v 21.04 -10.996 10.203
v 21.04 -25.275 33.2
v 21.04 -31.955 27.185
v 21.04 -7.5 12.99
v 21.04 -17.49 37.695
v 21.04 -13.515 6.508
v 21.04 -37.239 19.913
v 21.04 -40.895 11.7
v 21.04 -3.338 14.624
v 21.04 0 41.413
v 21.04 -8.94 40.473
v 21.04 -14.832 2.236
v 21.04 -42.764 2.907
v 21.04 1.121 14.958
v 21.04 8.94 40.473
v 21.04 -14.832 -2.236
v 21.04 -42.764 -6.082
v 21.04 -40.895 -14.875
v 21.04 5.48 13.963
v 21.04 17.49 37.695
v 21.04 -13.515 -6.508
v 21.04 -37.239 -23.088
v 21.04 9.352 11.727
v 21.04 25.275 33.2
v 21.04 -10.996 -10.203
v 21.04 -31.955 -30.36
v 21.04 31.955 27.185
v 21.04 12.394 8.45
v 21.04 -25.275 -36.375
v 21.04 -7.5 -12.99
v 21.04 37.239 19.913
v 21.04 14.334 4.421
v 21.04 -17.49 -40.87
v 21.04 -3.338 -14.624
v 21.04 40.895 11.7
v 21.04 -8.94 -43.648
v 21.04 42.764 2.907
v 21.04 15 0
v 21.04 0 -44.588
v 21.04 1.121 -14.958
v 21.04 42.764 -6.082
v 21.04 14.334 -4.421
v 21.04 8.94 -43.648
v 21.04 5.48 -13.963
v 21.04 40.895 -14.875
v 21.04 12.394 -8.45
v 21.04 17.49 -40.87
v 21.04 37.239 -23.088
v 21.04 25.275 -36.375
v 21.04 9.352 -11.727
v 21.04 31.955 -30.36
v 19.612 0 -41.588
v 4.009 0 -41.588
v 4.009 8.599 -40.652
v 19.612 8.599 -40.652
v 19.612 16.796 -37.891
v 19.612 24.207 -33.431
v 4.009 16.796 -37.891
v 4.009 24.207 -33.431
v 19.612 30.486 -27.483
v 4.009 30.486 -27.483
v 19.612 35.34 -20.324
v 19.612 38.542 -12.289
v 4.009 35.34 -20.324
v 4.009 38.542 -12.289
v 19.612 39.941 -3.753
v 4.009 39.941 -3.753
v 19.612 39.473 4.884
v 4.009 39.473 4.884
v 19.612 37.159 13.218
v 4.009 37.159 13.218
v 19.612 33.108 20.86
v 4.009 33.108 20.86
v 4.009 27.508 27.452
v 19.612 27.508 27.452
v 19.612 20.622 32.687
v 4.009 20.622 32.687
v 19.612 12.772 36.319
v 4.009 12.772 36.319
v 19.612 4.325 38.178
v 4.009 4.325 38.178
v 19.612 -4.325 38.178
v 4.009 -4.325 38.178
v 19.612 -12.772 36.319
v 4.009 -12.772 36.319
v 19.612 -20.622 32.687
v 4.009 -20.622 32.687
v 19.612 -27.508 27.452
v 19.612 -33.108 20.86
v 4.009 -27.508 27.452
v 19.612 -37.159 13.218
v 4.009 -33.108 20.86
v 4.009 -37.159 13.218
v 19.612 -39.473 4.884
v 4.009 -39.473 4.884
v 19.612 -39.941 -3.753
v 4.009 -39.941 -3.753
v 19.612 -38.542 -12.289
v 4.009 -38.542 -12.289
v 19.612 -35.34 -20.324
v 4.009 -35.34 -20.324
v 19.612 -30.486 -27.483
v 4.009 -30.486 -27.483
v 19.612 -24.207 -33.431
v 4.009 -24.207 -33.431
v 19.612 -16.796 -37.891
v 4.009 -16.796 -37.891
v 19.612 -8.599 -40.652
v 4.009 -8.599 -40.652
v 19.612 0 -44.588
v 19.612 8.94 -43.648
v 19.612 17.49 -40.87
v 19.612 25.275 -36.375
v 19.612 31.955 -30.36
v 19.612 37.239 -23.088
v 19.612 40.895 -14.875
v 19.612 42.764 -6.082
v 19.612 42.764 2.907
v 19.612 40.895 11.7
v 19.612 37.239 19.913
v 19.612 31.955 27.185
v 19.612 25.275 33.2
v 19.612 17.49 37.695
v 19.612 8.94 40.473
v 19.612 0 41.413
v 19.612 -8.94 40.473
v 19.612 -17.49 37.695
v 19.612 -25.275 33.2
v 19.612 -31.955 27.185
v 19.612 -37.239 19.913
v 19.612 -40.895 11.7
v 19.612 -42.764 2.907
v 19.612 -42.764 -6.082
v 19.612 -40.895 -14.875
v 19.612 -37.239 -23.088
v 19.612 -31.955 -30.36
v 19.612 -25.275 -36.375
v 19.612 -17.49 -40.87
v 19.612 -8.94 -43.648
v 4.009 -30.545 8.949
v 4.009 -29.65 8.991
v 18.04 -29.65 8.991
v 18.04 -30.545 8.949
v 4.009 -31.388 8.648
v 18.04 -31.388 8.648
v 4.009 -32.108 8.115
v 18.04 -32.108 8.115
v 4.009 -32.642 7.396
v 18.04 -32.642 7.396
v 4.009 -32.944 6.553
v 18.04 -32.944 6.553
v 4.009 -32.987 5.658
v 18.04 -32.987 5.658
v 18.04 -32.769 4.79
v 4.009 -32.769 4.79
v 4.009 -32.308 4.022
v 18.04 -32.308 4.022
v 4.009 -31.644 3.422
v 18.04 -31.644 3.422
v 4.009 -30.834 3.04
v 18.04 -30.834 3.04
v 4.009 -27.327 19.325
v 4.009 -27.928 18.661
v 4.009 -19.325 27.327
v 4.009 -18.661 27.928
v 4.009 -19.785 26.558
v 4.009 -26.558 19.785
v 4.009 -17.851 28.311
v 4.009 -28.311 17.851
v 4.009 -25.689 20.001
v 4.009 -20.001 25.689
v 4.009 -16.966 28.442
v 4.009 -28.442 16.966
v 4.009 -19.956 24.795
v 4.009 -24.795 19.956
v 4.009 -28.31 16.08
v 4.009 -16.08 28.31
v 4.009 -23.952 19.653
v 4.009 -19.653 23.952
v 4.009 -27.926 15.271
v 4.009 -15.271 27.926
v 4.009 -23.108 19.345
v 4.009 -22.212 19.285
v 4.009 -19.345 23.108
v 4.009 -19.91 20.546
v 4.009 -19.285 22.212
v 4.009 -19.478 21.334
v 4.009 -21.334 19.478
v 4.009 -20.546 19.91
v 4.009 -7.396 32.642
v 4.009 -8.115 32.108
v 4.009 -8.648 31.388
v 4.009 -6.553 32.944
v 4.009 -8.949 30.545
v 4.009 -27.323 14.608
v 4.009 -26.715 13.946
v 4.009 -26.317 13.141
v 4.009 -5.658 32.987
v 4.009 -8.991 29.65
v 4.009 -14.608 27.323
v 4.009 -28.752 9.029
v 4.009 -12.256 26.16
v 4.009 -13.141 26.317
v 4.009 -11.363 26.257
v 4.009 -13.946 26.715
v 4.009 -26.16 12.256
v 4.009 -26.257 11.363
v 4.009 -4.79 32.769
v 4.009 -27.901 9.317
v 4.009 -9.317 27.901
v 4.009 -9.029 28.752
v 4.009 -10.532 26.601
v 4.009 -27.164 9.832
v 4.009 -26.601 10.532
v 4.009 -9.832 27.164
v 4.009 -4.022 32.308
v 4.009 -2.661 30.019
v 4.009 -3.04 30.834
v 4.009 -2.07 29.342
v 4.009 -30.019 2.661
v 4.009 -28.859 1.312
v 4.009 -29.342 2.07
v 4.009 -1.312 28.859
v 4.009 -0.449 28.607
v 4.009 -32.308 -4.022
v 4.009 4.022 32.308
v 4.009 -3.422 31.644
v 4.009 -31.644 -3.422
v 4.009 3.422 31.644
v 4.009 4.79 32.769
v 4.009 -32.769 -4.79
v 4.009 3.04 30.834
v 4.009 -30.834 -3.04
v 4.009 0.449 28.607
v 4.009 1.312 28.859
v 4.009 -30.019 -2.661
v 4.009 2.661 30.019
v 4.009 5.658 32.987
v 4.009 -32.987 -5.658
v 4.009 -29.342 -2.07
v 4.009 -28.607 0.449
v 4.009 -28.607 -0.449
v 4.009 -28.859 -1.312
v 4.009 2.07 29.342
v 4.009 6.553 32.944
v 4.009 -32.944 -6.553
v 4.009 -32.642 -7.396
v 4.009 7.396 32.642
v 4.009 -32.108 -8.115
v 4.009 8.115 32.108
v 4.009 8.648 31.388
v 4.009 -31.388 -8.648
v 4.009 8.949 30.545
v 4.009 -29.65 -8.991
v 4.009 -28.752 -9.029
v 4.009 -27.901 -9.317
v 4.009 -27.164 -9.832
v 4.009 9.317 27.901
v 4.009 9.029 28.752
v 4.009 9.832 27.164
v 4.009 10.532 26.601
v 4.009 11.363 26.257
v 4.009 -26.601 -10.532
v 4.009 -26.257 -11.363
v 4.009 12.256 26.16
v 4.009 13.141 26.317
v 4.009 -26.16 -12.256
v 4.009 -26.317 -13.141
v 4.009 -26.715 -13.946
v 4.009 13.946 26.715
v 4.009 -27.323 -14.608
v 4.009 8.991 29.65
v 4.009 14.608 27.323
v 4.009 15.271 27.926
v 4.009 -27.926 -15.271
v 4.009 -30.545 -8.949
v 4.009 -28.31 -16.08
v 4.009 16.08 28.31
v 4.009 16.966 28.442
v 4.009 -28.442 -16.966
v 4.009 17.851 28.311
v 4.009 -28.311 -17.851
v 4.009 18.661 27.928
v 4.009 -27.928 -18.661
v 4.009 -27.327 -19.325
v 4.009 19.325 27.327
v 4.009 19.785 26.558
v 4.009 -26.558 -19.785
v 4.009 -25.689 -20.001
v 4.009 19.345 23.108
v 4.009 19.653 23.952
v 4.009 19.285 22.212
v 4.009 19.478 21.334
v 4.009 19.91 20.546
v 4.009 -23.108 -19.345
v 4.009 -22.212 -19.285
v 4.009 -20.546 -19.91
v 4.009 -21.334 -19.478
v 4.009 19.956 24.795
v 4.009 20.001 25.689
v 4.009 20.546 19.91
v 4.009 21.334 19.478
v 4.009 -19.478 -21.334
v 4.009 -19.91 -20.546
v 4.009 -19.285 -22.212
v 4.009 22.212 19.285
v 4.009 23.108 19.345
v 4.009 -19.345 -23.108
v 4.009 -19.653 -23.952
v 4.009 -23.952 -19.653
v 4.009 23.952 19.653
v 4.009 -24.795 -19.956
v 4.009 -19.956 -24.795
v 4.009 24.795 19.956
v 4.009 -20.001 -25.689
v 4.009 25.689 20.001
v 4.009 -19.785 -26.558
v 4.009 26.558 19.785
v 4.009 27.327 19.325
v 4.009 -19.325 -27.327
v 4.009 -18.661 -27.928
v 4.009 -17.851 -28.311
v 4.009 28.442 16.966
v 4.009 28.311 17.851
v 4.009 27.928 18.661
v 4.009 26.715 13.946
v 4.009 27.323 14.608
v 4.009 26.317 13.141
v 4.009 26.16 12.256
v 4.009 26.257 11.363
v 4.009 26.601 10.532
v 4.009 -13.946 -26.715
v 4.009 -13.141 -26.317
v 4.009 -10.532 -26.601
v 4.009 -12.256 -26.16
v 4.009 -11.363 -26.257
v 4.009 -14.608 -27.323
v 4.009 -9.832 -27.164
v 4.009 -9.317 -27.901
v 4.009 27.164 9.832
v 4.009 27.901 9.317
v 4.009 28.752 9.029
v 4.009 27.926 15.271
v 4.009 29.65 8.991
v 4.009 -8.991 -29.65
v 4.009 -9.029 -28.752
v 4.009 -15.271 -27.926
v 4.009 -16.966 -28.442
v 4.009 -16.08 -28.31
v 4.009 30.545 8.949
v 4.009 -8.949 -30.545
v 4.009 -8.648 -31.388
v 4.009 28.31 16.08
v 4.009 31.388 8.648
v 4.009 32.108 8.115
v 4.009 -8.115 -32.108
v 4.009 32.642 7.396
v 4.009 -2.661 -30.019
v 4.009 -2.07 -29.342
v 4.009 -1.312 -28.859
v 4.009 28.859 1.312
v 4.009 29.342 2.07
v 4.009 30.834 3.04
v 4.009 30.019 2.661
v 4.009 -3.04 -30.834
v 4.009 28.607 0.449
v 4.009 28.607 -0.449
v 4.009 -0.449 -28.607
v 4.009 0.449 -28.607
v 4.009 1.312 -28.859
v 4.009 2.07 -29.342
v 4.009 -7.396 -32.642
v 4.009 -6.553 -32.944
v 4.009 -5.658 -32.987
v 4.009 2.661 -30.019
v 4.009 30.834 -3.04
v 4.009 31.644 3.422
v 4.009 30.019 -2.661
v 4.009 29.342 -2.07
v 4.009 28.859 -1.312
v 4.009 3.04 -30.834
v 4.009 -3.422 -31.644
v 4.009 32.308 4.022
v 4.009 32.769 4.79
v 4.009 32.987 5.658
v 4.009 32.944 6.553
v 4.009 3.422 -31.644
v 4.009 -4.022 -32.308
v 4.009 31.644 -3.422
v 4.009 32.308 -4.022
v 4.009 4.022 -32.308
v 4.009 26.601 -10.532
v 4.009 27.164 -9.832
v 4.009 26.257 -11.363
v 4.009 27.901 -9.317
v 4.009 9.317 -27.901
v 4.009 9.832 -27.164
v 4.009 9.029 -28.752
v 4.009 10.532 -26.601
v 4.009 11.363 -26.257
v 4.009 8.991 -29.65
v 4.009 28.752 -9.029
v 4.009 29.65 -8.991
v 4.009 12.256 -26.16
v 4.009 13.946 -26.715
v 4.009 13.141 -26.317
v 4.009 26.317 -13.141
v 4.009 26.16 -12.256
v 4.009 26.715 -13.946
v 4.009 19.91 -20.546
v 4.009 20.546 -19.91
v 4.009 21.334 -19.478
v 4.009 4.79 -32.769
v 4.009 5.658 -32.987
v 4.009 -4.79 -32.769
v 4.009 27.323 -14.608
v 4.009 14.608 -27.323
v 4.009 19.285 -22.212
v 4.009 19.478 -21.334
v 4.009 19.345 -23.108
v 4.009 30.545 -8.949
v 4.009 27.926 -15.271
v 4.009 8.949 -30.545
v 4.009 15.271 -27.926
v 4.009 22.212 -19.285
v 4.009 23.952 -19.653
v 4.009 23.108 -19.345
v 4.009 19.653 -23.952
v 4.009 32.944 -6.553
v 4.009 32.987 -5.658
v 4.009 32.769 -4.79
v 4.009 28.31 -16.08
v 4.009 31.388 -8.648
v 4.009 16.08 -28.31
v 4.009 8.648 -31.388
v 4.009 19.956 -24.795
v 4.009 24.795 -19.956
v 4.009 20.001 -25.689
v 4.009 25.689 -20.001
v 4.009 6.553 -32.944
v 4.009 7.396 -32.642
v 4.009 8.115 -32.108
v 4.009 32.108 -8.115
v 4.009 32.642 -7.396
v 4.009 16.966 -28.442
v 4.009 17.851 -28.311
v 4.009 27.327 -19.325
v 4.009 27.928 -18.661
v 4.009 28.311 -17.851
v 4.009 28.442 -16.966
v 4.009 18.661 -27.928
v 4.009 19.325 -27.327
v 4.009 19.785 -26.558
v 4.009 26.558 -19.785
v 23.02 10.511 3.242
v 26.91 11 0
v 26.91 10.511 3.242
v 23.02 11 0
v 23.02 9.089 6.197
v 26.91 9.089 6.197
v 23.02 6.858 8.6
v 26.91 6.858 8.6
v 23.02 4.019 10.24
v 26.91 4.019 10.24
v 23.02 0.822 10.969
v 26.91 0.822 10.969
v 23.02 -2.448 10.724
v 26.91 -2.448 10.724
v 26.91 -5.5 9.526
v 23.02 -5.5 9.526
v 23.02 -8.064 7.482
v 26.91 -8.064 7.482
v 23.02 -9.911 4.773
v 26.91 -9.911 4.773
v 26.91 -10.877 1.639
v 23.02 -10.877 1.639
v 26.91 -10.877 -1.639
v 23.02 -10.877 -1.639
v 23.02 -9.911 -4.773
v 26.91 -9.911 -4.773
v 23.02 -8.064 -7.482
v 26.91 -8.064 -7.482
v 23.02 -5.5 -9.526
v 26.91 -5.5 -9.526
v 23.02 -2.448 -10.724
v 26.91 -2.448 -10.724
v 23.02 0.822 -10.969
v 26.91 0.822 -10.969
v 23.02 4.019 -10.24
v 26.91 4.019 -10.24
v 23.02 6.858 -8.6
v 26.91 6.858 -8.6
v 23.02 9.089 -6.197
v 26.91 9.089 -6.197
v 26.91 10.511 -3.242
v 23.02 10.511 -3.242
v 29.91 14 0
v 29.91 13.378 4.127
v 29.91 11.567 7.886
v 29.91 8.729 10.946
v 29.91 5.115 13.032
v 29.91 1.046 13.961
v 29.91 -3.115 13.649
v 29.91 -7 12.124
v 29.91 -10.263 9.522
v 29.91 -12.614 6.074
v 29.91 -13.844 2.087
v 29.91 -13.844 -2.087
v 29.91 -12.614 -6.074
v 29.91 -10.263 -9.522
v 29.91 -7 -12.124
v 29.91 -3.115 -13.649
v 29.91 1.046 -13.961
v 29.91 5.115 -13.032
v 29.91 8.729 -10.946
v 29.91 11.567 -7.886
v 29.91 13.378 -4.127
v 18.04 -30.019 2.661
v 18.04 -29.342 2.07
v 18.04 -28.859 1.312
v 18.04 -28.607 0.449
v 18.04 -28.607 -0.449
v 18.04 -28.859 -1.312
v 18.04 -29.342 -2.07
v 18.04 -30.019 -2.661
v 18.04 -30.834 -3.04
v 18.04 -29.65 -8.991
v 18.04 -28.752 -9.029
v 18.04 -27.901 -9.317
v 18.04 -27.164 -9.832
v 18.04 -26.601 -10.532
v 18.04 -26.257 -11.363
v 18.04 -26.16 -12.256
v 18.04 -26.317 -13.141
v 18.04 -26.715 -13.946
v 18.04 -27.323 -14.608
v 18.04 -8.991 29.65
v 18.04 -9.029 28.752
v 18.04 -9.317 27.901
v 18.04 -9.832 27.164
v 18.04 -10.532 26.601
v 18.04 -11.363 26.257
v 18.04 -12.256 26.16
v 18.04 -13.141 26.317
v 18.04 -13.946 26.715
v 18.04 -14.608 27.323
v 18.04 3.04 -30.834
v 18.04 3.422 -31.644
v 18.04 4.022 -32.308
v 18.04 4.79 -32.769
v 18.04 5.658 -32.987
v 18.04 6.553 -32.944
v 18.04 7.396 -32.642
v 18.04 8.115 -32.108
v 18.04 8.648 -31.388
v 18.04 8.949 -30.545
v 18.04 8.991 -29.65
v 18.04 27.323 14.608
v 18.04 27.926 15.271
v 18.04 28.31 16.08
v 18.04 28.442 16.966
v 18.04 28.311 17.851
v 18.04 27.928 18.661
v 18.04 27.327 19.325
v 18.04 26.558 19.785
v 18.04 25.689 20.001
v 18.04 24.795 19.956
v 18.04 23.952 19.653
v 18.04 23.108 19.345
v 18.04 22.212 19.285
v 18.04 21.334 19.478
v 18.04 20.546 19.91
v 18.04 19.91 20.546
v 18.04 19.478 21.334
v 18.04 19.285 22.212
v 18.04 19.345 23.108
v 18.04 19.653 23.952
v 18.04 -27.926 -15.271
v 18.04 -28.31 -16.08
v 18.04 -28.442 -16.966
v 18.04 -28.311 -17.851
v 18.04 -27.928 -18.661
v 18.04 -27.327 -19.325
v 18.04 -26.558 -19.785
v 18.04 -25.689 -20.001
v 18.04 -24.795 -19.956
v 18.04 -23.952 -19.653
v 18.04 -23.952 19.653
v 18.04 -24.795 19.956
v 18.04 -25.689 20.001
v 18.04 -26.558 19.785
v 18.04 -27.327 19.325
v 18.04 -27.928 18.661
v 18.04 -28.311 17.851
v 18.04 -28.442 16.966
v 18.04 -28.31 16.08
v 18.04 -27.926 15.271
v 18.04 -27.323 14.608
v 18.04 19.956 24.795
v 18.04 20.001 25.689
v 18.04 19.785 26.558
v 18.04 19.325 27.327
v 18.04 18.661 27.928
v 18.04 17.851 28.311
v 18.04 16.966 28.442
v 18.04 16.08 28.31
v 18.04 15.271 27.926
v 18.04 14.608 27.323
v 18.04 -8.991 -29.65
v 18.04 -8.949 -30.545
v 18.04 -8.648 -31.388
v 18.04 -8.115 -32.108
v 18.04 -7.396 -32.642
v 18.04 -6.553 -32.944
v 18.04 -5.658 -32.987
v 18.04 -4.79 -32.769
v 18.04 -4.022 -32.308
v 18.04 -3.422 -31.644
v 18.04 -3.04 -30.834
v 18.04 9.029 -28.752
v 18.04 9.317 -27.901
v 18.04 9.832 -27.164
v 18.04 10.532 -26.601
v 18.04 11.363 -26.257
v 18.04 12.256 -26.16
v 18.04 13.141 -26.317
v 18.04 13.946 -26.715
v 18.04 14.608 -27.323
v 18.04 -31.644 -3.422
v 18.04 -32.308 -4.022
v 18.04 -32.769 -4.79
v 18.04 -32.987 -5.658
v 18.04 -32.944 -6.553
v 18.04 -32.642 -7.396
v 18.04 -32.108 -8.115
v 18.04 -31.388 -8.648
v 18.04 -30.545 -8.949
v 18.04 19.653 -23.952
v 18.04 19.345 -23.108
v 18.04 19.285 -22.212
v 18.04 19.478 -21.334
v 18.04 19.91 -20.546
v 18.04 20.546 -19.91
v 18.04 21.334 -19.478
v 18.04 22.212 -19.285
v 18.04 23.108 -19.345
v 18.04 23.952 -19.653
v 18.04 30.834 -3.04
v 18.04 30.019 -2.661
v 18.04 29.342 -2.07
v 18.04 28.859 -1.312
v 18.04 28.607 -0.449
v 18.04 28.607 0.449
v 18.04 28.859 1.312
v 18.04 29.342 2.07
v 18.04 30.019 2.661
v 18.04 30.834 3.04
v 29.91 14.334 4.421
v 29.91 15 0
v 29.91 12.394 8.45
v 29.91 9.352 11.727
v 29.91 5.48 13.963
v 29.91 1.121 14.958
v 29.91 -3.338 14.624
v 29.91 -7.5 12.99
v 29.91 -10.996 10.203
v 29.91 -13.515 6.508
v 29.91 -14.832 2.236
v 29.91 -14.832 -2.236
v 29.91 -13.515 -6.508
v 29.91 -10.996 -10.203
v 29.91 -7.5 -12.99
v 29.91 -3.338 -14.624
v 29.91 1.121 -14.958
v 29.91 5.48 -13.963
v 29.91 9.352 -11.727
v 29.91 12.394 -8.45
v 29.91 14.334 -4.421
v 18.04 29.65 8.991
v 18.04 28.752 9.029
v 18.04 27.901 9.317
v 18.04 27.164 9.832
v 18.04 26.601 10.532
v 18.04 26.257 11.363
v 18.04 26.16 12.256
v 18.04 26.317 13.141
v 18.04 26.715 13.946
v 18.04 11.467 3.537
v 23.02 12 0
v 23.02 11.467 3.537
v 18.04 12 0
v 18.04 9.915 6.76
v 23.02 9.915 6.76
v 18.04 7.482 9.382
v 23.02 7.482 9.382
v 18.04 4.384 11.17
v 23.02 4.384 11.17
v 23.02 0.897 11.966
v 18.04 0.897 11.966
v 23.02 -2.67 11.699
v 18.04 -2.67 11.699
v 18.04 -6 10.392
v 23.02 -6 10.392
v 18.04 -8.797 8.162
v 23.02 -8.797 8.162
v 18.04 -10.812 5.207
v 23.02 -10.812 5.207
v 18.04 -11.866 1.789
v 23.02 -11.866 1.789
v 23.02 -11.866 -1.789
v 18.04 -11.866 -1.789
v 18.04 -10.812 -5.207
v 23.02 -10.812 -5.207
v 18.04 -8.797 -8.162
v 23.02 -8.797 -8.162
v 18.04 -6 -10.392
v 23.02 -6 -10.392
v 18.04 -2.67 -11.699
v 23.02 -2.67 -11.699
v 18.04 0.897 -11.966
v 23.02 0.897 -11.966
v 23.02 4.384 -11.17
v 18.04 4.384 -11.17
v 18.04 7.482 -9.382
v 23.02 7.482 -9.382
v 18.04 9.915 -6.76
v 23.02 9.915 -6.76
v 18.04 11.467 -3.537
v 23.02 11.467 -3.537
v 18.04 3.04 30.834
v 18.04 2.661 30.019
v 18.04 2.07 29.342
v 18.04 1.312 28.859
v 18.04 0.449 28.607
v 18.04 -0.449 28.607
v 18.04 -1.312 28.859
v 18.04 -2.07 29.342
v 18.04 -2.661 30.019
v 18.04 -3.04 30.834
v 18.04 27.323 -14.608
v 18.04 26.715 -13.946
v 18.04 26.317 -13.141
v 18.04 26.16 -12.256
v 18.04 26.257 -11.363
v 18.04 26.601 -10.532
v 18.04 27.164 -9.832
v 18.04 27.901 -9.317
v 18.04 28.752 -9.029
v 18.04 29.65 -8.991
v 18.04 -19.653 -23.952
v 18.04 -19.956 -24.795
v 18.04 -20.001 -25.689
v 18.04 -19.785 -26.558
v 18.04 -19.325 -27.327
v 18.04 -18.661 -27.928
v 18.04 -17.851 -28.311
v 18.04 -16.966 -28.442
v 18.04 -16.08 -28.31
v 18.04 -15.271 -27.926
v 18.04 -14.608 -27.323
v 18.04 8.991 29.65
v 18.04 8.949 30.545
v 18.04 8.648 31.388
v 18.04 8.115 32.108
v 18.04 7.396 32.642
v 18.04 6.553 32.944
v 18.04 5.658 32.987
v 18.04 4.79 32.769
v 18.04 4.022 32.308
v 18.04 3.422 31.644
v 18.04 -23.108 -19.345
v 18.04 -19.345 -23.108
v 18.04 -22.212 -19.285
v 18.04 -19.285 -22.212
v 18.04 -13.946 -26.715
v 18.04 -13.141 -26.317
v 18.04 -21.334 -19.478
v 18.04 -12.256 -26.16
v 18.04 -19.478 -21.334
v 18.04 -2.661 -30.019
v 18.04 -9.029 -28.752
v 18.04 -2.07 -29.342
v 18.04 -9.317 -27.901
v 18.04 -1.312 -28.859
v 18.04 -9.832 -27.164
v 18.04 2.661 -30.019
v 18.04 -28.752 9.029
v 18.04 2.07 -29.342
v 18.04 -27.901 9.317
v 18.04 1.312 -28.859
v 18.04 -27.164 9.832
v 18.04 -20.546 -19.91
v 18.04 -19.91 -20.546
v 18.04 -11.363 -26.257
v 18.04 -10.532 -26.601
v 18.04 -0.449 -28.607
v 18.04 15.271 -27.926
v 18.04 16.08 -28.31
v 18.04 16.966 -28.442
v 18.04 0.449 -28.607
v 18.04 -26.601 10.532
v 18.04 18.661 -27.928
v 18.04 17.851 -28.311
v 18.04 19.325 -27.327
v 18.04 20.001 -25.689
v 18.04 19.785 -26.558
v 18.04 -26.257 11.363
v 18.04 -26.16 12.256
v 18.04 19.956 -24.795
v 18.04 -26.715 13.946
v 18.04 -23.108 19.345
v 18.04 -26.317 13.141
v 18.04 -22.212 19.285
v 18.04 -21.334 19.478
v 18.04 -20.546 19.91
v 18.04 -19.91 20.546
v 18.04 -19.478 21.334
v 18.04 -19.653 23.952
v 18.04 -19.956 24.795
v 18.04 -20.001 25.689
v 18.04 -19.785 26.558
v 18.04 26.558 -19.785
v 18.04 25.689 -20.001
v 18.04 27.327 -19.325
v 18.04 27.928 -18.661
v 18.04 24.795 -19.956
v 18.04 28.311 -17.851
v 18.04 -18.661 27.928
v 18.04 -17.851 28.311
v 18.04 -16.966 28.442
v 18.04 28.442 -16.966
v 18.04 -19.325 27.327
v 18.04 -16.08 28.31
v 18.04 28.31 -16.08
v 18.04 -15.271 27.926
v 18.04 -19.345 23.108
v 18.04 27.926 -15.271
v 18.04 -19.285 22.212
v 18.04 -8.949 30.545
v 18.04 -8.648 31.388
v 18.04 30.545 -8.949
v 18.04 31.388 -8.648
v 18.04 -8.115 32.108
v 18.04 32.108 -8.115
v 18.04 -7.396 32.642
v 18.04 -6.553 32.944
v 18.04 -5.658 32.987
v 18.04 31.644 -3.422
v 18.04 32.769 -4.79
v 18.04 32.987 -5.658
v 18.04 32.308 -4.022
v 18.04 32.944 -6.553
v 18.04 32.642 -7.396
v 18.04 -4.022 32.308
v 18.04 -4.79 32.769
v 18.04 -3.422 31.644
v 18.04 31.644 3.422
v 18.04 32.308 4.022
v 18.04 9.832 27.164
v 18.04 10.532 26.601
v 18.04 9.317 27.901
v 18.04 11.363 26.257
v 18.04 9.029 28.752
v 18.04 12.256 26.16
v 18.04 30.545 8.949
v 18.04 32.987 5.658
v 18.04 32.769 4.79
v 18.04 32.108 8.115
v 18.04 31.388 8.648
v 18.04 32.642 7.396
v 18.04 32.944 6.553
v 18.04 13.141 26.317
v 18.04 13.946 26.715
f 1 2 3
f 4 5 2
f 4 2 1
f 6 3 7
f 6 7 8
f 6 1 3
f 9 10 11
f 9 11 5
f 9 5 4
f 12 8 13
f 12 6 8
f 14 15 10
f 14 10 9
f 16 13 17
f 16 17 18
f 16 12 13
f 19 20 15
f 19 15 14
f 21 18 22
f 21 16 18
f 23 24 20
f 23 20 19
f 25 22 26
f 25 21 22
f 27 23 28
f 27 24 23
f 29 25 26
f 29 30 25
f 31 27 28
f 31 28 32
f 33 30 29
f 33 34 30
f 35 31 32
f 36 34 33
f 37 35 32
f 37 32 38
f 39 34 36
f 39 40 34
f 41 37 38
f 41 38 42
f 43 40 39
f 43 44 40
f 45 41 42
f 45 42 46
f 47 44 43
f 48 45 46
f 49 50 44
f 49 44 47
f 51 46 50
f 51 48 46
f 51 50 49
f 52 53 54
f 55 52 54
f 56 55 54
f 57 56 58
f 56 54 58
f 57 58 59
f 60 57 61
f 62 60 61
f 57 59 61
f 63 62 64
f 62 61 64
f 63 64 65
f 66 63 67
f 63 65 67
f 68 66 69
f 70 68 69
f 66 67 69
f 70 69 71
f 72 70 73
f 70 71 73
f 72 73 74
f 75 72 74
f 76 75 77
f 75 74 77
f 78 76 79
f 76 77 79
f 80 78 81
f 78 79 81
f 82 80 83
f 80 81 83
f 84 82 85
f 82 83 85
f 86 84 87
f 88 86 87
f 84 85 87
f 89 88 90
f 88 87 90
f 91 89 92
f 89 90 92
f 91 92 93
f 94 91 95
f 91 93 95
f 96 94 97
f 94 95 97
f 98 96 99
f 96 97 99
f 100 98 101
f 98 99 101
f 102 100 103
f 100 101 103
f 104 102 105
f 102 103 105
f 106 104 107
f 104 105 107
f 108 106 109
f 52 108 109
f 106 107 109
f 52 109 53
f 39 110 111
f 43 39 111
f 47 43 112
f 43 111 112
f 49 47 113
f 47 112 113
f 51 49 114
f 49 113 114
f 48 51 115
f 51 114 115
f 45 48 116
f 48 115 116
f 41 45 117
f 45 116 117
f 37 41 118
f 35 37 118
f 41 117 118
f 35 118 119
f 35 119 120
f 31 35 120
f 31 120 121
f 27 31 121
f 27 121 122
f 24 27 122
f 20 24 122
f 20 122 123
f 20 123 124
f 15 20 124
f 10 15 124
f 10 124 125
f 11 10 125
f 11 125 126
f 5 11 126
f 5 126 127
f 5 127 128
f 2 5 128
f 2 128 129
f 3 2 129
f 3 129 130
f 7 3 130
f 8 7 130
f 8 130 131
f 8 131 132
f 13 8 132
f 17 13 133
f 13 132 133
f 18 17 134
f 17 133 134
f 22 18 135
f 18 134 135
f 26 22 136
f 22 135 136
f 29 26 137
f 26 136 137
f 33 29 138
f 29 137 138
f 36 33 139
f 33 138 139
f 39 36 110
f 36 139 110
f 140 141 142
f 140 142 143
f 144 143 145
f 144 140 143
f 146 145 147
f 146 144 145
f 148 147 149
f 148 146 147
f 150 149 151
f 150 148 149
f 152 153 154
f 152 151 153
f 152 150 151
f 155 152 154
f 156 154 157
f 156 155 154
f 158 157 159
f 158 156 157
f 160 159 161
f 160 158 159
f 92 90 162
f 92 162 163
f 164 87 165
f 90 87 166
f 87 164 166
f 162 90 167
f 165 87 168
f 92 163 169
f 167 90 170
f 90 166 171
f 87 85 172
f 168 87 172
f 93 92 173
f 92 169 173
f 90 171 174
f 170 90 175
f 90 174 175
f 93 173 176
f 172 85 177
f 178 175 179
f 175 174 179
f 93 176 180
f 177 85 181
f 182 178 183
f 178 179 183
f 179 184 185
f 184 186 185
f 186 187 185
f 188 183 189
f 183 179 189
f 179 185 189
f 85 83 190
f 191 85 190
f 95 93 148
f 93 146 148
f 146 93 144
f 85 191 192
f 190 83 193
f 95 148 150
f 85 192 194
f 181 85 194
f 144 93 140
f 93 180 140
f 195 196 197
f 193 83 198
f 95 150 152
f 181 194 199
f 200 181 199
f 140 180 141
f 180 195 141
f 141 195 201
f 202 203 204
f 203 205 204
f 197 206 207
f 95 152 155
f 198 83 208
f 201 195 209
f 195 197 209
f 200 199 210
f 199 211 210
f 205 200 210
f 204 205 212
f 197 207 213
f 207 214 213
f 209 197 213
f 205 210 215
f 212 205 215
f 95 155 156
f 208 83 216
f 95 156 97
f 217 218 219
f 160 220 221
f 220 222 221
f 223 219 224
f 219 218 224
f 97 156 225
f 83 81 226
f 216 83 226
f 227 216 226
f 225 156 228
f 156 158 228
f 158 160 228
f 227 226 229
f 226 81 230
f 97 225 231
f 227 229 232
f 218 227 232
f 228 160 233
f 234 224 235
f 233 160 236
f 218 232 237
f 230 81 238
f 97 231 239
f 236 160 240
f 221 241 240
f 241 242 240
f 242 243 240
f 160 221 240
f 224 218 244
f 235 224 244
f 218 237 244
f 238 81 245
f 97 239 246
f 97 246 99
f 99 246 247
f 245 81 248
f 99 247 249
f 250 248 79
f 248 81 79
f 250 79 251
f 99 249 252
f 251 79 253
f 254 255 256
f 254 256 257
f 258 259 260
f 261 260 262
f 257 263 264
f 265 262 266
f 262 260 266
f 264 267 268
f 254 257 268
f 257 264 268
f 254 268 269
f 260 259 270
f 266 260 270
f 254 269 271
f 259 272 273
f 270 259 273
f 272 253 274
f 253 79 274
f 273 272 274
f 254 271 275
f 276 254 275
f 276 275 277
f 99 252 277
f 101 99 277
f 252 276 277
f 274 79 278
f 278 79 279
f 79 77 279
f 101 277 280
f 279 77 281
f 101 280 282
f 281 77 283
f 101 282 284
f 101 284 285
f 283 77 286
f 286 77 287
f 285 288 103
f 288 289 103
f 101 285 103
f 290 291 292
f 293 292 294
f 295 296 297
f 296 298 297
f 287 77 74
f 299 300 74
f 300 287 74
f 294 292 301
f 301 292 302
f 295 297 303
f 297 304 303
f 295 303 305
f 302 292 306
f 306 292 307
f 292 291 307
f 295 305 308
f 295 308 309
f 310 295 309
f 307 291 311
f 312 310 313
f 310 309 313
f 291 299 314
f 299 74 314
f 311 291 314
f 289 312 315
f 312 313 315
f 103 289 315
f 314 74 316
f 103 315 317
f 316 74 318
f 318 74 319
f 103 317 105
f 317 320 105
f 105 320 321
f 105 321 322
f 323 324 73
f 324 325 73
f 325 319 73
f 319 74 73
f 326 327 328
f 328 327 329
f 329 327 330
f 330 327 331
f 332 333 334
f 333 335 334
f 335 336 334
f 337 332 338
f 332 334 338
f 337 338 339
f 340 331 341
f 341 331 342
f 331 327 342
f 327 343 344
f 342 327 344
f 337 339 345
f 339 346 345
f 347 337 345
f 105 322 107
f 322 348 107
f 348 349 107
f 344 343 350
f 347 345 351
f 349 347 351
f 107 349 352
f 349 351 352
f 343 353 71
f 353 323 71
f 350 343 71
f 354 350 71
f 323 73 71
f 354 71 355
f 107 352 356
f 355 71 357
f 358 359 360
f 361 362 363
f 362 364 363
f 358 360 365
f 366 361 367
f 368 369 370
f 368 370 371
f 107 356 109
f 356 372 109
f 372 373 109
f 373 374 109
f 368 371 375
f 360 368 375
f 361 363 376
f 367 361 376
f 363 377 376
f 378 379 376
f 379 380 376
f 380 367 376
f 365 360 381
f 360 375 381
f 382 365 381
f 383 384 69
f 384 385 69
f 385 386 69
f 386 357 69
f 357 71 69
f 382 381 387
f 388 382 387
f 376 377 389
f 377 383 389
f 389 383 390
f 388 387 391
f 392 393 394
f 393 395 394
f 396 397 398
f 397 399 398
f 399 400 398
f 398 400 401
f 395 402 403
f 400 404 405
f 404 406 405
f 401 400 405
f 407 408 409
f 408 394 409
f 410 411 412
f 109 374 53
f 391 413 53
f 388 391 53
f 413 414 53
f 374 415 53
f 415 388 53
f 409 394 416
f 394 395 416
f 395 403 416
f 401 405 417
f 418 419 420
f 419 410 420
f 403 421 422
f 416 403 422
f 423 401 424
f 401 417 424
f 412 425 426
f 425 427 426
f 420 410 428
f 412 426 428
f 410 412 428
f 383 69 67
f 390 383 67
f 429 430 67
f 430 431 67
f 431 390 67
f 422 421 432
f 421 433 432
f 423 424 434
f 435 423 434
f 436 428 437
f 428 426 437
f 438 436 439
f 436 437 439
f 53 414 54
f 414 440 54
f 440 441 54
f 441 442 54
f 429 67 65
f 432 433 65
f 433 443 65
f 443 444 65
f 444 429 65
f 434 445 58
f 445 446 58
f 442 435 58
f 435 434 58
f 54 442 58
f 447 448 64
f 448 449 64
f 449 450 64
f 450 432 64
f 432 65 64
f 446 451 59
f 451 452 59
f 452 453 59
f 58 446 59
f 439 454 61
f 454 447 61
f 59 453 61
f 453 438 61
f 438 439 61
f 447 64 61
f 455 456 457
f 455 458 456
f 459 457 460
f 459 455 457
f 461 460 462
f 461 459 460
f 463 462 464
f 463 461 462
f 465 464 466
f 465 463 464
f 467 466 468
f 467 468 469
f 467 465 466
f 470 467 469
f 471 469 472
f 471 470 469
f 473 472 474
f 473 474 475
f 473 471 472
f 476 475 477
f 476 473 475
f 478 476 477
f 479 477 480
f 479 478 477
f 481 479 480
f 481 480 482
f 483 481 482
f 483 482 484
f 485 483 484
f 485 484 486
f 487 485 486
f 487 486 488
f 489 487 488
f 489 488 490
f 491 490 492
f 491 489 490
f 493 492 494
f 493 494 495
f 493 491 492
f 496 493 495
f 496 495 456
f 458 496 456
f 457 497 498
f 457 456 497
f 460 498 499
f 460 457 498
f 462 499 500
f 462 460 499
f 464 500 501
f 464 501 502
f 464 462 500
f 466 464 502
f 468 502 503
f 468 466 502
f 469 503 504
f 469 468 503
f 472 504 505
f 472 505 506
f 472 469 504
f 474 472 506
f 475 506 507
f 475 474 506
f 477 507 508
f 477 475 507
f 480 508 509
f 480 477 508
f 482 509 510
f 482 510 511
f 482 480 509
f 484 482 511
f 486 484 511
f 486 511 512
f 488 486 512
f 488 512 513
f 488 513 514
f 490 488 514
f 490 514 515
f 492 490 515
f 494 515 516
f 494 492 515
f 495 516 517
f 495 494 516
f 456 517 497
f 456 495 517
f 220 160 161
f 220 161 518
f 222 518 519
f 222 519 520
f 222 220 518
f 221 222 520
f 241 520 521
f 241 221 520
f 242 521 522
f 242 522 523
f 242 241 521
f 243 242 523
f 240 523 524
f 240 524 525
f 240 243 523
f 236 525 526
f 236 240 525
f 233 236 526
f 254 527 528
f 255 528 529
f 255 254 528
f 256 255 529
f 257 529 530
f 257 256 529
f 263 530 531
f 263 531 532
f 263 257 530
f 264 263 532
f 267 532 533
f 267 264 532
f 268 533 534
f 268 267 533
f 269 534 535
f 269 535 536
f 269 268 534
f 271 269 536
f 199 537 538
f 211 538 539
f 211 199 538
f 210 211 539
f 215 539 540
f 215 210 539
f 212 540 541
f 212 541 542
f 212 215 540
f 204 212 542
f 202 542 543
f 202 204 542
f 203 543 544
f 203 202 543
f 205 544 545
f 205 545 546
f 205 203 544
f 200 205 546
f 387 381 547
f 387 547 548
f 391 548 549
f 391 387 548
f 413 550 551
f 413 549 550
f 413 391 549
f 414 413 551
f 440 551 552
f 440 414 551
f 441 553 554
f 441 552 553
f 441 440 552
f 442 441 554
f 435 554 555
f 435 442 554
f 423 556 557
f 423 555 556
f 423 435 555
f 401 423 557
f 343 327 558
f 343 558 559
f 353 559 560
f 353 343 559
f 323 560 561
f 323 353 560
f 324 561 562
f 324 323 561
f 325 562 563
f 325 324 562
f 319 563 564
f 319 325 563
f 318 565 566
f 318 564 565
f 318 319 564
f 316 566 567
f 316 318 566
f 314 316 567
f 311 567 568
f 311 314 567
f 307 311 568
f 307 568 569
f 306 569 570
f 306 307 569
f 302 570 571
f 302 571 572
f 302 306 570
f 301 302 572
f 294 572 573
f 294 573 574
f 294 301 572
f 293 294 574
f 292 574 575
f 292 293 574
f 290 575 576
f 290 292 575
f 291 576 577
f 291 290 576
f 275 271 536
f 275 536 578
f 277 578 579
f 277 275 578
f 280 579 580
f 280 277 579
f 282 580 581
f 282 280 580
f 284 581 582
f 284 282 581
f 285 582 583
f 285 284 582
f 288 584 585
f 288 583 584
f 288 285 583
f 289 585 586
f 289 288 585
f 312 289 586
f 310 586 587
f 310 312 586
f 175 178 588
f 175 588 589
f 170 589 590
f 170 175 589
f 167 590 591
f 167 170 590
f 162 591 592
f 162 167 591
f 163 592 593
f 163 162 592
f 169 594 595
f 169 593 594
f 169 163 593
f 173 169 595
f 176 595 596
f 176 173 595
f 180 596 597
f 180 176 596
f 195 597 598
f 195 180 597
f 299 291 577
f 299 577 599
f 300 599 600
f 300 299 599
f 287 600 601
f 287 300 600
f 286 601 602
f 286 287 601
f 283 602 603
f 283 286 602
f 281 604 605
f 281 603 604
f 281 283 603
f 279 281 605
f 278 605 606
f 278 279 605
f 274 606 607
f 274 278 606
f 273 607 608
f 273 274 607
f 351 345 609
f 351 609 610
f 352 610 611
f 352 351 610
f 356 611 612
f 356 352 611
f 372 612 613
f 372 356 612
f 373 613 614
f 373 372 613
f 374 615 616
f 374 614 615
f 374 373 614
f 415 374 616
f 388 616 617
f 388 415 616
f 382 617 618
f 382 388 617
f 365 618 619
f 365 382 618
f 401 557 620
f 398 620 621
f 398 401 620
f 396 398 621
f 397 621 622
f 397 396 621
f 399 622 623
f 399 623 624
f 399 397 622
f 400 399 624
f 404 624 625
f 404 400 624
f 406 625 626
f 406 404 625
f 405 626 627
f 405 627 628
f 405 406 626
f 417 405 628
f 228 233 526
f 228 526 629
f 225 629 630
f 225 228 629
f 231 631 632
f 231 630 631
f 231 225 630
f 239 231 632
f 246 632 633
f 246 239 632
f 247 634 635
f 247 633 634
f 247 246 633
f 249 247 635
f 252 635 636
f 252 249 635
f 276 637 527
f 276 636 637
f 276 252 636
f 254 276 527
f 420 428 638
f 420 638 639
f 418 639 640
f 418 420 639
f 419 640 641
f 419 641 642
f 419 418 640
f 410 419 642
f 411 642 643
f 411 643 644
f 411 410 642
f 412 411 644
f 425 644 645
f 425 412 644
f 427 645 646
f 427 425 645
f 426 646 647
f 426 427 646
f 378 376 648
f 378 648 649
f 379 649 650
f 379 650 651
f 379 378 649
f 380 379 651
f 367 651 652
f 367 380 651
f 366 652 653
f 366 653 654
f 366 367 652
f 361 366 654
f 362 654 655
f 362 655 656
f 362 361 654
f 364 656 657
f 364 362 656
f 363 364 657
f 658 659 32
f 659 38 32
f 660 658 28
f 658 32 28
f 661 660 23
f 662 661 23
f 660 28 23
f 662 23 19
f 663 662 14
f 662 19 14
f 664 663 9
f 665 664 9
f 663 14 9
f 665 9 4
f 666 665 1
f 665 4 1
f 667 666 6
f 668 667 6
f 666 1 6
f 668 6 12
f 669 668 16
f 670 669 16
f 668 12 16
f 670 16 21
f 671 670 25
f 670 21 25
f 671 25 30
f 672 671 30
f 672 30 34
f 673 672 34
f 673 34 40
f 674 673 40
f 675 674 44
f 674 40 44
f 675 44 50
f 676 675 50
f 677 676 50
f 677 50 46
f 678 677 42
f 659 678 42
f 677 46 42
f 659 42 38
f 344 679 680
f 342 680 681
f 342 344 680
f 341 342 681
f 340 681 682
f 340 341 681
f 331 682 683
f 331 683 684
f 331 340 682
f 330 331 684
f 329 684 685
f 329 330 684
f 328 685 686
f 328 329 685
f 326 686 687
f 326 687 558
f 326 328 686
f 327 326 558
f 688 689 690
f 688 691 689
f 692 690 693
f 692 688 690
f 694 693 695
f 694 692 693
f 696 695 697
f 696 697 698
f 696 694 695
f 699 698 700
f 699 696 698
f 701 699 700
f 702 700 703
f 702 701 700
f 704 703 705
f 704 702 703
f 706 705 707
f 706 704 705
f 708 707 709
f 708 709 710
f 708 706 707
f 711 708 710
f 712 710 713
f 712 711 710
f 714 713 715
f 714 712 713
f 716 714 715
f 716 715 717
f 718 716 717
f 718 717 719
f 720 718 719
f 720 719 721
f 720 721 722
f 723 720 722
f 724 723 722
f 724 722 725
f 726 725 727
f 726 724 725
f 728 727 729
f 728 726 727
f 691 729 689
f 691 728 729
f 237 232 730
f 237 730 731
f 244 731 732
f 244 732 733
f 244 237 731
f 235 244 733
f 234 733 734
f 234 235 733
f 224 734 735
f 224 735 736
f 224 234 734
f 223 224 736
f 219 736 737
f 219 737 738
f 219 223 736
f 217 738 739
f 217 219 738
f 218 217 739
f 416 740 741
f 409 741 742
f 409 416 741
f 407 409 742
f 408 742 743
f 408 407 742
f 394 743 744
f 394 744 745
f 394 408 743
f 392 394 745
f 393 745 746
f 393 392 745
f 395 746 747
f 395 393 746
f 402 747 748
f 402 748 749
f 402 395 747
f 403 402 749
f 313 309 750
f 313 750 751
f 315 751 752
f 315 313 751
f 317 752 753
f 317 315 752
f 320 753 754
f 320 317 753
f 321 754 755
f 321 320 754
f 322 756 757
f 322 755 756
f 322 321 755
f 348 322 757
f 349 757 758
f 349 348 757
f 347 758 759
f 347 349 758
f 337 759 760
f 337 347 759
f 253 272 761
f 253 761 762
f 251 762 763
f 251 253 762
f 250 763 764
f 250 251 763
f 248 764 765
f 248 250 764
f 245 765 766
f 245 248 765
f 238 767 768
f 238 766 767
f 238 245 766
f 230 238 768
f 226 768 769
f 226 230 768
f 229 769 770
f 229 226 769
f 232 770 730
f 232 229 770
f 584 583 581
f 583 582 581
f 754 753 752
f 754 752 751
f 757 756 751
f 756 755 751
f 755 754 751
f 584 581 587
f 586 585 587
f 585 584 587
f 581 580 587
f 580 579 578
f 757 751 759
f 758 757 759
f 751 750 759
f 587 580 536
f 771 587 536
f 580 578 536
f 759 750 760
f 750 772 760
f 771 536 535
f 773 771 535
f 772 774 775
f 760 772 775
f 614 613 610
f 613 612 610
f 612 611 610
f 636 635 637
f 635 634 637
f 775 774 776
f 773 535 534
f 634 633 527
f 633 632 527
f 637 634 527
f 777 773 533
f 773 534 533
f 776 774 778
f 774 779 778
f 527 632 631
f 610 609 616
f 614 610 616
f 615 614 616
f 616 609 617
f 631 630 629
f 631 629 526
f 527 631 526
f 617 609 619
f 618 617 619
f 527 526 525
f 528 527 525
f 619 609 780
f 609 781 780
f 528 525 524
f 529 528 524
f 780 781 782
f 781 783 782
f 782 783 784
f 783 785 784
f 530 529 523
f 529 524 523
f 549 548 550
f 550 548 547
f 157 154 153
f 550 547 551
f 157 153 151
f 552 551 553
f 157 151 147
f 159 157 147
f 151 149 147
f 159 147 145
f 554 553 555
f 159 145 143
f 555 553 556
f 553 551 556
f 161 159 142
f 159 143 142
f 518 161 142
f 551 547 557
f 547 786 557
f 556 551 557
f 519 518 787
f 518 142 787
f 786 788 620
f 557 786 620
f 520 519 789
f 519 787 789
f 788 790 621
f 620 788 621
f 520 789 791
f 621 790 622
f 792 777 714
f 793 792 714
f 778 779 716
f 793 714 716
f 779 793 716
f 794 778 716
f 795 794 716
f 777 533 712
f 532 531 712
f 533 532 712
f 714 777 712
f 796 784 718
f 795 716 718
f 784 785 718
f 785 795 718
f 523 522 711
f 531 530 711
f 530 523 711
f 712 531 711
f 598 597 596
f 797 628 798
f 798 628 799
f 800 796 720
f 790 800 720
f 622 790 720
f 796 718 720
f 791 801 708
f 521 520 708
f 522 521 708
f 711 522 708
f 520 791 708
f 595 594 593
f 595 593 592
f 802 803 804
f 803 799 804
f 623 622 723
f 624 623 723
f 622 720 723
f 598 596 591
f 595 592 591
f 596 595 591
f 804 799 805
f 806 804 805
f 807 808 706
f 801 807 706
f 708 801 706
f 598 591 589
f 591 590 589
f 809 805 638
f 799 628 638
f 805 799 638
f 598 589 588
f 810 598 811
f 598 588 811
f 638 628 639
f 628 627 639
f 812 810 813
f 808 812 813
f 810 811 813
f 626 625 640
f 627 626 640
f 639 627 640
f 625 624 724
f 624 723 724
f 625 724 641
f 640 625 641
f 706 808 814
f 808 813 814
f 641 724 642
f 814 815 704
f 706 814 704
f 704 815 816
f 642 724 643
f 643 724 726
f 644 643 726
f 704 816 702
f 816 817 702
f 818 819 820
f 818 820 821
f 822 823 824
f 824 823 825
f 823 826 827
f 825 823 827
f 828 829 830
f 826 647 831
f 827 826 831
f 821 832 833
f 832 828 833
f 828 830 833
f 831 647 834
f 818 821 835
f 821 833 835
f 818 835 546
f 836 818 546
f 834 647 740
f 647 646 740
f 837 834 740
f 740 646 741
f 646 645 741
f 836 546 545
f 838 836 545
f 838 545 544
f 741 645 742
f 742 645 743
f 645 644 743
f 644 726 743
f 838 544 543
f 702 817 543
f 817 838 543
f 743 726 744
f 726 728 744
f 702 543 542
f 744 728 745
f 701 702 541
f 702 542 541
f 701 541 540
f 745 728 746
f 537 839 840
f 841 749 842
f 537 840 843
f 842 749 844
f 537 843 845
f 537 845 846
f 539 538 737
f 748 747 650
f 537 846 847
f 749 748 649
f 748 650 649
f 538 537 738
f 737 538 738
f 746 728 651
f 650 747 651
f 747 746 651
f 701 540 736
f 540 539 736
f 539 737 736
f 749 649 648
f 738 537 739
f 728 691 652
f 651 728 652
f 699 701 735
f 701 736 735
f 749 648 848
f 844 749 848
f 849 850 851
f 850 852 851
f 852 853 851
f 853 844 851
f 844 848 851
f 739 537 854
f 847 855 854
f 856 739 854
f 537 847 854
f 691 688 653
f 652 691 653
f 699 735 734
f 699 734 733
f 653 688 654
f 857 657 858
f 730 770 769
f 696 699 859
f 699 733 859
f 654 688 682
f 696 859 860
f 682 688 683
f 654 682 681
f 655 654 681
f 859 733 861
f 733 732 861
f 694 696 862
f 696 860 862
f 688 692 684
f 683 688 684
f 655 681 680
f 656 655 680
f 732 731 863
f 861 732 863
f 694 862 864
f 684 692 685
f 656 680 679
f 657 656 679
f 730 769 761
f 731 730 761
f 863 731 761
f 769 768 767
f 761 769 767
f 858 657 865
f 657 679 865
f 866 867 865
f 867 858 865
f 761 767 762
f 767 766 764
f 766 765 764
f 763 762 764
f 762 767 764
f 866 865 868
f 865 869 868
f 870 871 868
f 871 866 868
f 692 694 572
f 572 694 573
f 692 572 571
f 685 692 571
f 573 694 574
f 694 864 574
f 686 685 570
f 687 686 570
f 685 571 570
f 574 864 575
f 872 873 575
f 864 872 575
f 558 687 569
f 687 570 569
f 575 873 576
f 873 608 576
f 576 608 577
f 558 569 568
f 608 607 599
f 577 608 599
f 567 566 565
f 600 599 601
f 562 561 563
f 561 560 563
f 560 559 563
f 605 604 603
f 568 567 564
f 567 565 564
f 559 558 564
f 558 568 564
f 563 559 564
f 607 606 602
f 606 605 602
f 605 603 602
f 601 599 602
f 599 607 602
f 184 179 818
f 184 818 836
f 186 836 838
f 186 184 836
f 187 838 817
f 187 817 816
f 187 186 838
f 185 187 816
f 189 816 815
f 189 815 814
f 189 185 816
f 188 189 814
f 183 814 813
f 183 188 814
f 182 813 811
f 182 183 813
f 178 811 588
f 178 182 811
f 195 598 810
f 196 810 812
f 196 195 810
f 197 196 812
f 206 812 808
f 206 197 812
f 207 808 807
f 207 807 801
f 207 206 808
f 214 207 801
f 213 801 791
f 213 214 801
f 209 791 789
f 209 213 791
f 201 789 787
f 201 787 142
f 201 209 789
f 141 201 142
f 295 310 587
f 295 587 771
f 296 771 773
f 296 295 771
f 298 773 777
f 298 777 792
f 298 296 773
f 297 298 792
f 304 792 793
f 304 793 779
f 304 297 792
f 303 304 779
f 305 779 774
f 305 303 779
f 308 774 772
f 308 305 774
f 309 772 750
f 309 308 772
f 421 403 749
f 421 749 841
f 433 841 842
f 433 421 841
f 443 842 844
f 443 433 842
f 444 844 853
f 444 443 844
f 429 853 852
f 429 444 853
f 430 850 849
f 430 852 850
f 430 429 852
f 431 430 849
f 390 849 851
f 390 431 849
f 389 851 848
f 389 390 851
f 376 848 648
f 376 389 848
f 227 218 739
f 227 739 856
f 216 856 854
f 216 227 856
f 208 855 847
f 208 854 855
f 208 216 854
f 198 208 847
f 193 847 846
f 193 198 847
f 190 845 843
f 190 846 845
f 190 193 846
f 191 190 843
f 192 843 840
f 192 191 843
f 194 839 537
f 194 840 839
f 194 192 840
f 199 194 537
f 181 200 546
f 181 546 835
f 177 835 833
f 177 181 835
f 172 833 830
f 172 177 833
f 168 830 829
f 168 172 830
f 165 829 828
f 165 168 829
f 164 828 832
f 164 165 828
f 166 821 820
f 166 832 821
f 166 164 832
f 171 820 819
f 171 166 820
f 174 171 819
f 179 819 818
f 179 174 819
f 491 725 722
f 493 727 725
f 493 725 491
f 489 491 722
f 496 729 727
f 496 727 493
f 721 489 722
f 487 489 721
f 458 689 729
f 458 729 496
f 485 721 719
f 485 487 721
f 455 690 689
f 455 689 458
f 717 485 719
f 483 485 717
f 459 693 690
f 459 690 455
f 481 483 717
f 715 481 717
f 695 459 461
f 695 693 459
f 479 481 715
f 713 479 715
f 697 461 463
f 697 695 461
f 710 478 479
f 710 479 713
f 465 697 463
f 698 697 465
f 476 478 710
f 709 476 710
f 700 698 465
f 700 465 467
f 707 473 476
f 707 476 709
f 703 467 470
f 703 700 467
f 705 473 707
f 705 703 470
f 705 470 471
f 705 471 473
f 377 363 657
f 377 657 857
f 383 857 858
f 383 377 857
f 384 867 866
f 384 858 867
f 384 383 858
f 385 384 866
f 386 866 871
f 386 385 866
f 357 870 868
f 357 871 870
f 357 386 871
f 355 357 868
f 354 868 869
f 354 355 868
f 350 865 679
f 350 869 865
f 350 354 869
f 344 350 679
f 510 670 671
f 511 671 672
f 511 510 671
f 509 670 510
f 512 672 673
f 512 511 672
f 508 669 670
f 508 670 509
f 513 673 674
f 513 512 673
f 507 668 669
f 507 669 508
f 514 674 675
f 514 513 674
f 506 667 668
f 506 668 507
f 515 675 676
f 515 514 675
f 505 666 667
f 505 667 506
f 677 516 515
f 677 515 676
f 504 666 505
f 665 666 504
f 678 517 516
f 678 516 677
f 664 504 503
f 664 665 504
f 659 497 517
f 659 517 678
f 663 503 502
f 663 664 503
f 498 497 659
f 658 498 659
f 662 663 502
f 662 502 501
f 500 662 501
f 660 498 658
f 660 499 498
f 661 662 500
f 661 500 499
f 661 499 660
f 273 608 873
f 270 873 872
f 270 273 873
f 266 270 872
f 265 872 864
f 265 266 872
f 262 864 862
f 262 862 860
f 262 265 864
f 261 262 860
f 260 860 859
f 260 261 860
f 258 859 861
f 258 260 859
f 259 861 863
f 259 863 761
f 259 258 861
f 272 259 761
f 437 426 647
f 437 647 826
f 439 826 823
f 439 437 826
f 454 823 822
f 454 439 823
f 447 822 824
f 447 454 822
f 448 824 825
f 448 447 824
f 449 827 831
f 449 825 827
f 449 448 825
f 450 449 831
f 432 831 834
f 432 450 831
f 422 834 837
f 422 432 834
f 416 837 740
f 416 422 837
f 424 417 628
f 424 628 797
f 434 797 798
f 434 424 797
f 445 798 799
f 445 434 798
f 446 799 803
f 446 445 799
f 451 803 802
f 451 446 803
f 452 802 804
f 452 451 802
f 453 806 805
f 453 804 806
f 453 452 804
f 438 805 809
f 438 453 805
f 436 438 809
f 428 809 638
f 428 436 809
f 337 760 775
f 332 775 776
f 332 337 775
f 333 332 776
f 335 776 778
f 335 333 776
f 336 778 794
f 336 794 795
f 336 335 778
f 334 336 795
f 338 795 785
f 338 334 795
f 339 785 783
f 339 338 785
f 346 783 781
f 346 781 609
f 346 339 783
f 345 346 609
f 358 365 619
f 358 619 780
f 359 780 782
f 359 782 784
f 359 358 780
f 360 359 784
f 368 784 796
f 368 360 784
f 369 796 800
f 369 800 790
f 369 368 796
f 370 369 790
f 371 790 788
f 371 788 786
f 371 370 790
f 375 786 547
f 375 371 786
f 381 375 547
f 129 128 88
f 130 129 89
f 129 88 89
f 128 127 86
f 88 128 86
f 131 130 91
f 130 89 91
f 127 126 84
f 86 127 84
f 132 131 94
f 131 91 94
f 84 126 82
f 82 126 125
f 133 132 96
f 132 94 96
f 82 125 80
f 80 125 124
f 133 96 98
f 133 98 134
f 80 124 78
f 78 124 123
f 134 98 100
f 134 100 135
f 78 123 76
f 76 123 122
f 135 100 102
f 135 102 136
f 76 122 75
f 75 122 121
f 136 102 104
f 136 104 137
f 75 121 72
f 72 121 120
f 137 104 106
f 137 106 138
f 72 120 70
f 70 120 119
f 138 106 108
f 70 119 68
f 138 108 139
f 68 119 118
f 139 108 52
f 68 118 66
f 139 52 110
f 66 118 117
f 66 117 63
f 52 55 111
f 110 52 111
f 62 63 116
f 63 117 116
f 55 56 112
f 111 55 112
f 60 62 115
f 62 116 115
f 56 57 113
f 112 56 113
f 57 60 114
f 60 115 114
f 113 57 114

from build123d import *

# Parameters (mm, degrees)
BOSS_EXTRUDE1_START = 4.0094
SKETCH6_R           = 43.000000106
BOSS_EXTRUDE1_DEPTH = 17.0304
CUT_EXTRUDE1_START  = 4.0094
SKETCH7_R           = 43.000000106
SKETCH7_R_2         = 40.00000001
CUT_EXTRUDE1_DEPTH  = 15.60215


with BuildPart() as part:
    # Sketch5 → Revolve1 (revolve)
    with BuildSketch(Plane.XY):
        Polygon((23.019799782, 10.999999971), (23.019799782, 12.000000003), (18.039799836, 12.000000003), (18.039799836, 31.75), (18.039799836, 35.875000005), (21.039799932, 35.875000005), (21.039799932, 14.999999972), (22.939799942, 14.999999972), (29.909799972, 14.999999972), (29.909799972, 13.99999994), (26.909800003, 10.999999971), align=None)
    revolve(axis=Axis((0, 0, 0), (1, 0, 0)))

    # Sketch6 → Boss-Extrude1 (add)
    with BuildSketch(Plane(origin=(0, 0, 0), x_dir=(0, 0, -1), z_dir=(1, 0, 0)).offset(BOSS_EXTRUDE1_START)):
        with Locations((1.5875, 0)):
            Circle(SKETCH6_R)
        with BuildLine():
            ThreePointArc((-23.952340618, 19.653227004), (-27.928292299, 18.661088308), (-27.323378098, 14.608112886))
            ThreePointArc((-27.323378098, 14.608112886), (-26.399857642, 10.93517908), (-29.65004162, 8.991050256))
            ThreePointArc((-29.65004162, 8.991050256), (-32.943666958, 6.552902785), (-30.833792563, 3.039932389))
            ThreePointArc((-30.833792563, 3.039932389), (-28.575, 0), (-30.833792563, -3.039932389))
            ThreePointArc((-30.833792563, -3.039932389), (-32.943666958, -6.552902785), (-29.65004162, -8.991050256))
            ThreePointArc((-29.65004162, -8.991050256), (-26.399857642, -10.93517908), (-27.323378098, -14.608112886))
            ThreePointArc((-27.323378098, -14.608112886), (-27.928292299, -18.661088308), (-23.952340618, -19.653227004))
            ThreePointArc((-23.952340618, -19.653227004), (-20.205576272, -20.205576272), (-19.653227004, -23.952340618))
            ThreePointArc((-19.653227004, -23.952340618), (-18.661088308, -27.928292299), (-14.608112886, -27.323378098))
            ThreePointArc((-14.608112886, -27.323378098), (-10.93517908, -26.399857642), (-8.991050256, -29.65004162))
            ThreePointArc((-8.991050256, -29.65004162), (-6.552902785, -32.943666958), (-3.039932389, -30.833792563))
            ThreePointArc((-3.039932389, -30.833792563), (0, -28.575), (3.039932389, -30.833792563))
            ThreePointArc((3.039932389, -30.833792563), (6.552902785, -32.943666958), (8.991050256, -29.65004162))
            ThreePointArc((8.991050256, -29.65004162), (10.93517908, -26.399857642), (14.608112886, -27.323378098))
            ThreePointArc((14.608112886, -27.323378098), (18.661088308, -27.928292299), (19.653227004, -23.952340618))
            ThreePointArc((19.653227004, -23.952340618), (20.205576272, -20.205576272), (23.952340618, -19.653227004))
            ThreePointArc((23.952340618, -19.653227004), (27.928292299, -18.661088308), (27.323378098, -14.608112886))
            ThreePointArc((27.323378098, -14.608112886), (26.399857642, -10.93517908), (29.65004162, -8.991050256))
            ThreePointArc((29.65004162, -8.991050256), (32.943666958, -6.552902785), (30.833792563, -3.039932389))
            ThreePointArc((30.833792563, -3.039932389), (28.575, 0), (30.833792563, 3.039932389))
            ThreePointArc((30.833792563, 3.039932389), (32.943666958, 6.552902785), (29.65004162, 8.991050256))
            ThreePointArc((29.65004162, 8.991050256), (26.399857642, 10.93517908), (27.323378098, 14.608112886))
            ThreePointArc((27.323378098, 14.608112886), (27.928292299, 18.661088308), (23.952340618, 19.653227004))
            ThreePointArc((23.952340618, 19.653227004), (20.205576272, 20.205576272), (19.653227004, 23.952340618))
            ThreePointArc((19.653227004, 23.952340618), (18.661088308, 27.928292299), (14.608112886, 27.323378098))
            ThreePointArc((14.608112886, 27.323378098), (10.93517908, 26.399857642), (8.991050256, 29.65004162))
            ThreePointArc((8.991050256, 29.65004162), (6.552902785, 32.943666958), (3.039932389, 30.833792563))
            ThreePointArc((3.039932389, 30.833792563), (0, 28.575), (-3.039932389, 30.833792563))
            ThreePointArc((-3.039932389, 30.833792563), (-6.552902785, 32.943666958), (-8.991050256, 29.65004162))
            ThreePointArc((-8.991050256, 29.65004162), (-10.93517908, 26.399857642), (-14.608112886, 27.323378098))
            ThreePointArc((-14.608112886, 27.323378098), (-18.661088308, 27.928292299), (-19.653227004, 23.952340618))
            ThreePointArc((-19.653227004, 23.952340618), (-20.205576272, 20.205576272), (-23.952340618, 19.653227004))
        make_face(mode=Mode.SUBTRACT)
    extrude(amount=BOSS_EXTRUDE1_DEPTH)

    # Sketch7 → Cut-Extrude1 (cut)
    with BuildSketch(Plane(origin=(0, 0, 0), x_dir=(0, 0, -1), z_dir=(1, 0, 0)).offset(CUT_EXTRUDE1_START)):
        with Locations((1.5875, 0)):
            Circle(SKETCH7_R)
        with Locations((1.5875, 0)):
            Circle(SKETCH7_R_2, mode=Mode.SUBTRACT)
    extrude(amount=CUT_EXTRUDE1_DEPTH, mode=Mode.SUBTRACT)


solid = part.part
